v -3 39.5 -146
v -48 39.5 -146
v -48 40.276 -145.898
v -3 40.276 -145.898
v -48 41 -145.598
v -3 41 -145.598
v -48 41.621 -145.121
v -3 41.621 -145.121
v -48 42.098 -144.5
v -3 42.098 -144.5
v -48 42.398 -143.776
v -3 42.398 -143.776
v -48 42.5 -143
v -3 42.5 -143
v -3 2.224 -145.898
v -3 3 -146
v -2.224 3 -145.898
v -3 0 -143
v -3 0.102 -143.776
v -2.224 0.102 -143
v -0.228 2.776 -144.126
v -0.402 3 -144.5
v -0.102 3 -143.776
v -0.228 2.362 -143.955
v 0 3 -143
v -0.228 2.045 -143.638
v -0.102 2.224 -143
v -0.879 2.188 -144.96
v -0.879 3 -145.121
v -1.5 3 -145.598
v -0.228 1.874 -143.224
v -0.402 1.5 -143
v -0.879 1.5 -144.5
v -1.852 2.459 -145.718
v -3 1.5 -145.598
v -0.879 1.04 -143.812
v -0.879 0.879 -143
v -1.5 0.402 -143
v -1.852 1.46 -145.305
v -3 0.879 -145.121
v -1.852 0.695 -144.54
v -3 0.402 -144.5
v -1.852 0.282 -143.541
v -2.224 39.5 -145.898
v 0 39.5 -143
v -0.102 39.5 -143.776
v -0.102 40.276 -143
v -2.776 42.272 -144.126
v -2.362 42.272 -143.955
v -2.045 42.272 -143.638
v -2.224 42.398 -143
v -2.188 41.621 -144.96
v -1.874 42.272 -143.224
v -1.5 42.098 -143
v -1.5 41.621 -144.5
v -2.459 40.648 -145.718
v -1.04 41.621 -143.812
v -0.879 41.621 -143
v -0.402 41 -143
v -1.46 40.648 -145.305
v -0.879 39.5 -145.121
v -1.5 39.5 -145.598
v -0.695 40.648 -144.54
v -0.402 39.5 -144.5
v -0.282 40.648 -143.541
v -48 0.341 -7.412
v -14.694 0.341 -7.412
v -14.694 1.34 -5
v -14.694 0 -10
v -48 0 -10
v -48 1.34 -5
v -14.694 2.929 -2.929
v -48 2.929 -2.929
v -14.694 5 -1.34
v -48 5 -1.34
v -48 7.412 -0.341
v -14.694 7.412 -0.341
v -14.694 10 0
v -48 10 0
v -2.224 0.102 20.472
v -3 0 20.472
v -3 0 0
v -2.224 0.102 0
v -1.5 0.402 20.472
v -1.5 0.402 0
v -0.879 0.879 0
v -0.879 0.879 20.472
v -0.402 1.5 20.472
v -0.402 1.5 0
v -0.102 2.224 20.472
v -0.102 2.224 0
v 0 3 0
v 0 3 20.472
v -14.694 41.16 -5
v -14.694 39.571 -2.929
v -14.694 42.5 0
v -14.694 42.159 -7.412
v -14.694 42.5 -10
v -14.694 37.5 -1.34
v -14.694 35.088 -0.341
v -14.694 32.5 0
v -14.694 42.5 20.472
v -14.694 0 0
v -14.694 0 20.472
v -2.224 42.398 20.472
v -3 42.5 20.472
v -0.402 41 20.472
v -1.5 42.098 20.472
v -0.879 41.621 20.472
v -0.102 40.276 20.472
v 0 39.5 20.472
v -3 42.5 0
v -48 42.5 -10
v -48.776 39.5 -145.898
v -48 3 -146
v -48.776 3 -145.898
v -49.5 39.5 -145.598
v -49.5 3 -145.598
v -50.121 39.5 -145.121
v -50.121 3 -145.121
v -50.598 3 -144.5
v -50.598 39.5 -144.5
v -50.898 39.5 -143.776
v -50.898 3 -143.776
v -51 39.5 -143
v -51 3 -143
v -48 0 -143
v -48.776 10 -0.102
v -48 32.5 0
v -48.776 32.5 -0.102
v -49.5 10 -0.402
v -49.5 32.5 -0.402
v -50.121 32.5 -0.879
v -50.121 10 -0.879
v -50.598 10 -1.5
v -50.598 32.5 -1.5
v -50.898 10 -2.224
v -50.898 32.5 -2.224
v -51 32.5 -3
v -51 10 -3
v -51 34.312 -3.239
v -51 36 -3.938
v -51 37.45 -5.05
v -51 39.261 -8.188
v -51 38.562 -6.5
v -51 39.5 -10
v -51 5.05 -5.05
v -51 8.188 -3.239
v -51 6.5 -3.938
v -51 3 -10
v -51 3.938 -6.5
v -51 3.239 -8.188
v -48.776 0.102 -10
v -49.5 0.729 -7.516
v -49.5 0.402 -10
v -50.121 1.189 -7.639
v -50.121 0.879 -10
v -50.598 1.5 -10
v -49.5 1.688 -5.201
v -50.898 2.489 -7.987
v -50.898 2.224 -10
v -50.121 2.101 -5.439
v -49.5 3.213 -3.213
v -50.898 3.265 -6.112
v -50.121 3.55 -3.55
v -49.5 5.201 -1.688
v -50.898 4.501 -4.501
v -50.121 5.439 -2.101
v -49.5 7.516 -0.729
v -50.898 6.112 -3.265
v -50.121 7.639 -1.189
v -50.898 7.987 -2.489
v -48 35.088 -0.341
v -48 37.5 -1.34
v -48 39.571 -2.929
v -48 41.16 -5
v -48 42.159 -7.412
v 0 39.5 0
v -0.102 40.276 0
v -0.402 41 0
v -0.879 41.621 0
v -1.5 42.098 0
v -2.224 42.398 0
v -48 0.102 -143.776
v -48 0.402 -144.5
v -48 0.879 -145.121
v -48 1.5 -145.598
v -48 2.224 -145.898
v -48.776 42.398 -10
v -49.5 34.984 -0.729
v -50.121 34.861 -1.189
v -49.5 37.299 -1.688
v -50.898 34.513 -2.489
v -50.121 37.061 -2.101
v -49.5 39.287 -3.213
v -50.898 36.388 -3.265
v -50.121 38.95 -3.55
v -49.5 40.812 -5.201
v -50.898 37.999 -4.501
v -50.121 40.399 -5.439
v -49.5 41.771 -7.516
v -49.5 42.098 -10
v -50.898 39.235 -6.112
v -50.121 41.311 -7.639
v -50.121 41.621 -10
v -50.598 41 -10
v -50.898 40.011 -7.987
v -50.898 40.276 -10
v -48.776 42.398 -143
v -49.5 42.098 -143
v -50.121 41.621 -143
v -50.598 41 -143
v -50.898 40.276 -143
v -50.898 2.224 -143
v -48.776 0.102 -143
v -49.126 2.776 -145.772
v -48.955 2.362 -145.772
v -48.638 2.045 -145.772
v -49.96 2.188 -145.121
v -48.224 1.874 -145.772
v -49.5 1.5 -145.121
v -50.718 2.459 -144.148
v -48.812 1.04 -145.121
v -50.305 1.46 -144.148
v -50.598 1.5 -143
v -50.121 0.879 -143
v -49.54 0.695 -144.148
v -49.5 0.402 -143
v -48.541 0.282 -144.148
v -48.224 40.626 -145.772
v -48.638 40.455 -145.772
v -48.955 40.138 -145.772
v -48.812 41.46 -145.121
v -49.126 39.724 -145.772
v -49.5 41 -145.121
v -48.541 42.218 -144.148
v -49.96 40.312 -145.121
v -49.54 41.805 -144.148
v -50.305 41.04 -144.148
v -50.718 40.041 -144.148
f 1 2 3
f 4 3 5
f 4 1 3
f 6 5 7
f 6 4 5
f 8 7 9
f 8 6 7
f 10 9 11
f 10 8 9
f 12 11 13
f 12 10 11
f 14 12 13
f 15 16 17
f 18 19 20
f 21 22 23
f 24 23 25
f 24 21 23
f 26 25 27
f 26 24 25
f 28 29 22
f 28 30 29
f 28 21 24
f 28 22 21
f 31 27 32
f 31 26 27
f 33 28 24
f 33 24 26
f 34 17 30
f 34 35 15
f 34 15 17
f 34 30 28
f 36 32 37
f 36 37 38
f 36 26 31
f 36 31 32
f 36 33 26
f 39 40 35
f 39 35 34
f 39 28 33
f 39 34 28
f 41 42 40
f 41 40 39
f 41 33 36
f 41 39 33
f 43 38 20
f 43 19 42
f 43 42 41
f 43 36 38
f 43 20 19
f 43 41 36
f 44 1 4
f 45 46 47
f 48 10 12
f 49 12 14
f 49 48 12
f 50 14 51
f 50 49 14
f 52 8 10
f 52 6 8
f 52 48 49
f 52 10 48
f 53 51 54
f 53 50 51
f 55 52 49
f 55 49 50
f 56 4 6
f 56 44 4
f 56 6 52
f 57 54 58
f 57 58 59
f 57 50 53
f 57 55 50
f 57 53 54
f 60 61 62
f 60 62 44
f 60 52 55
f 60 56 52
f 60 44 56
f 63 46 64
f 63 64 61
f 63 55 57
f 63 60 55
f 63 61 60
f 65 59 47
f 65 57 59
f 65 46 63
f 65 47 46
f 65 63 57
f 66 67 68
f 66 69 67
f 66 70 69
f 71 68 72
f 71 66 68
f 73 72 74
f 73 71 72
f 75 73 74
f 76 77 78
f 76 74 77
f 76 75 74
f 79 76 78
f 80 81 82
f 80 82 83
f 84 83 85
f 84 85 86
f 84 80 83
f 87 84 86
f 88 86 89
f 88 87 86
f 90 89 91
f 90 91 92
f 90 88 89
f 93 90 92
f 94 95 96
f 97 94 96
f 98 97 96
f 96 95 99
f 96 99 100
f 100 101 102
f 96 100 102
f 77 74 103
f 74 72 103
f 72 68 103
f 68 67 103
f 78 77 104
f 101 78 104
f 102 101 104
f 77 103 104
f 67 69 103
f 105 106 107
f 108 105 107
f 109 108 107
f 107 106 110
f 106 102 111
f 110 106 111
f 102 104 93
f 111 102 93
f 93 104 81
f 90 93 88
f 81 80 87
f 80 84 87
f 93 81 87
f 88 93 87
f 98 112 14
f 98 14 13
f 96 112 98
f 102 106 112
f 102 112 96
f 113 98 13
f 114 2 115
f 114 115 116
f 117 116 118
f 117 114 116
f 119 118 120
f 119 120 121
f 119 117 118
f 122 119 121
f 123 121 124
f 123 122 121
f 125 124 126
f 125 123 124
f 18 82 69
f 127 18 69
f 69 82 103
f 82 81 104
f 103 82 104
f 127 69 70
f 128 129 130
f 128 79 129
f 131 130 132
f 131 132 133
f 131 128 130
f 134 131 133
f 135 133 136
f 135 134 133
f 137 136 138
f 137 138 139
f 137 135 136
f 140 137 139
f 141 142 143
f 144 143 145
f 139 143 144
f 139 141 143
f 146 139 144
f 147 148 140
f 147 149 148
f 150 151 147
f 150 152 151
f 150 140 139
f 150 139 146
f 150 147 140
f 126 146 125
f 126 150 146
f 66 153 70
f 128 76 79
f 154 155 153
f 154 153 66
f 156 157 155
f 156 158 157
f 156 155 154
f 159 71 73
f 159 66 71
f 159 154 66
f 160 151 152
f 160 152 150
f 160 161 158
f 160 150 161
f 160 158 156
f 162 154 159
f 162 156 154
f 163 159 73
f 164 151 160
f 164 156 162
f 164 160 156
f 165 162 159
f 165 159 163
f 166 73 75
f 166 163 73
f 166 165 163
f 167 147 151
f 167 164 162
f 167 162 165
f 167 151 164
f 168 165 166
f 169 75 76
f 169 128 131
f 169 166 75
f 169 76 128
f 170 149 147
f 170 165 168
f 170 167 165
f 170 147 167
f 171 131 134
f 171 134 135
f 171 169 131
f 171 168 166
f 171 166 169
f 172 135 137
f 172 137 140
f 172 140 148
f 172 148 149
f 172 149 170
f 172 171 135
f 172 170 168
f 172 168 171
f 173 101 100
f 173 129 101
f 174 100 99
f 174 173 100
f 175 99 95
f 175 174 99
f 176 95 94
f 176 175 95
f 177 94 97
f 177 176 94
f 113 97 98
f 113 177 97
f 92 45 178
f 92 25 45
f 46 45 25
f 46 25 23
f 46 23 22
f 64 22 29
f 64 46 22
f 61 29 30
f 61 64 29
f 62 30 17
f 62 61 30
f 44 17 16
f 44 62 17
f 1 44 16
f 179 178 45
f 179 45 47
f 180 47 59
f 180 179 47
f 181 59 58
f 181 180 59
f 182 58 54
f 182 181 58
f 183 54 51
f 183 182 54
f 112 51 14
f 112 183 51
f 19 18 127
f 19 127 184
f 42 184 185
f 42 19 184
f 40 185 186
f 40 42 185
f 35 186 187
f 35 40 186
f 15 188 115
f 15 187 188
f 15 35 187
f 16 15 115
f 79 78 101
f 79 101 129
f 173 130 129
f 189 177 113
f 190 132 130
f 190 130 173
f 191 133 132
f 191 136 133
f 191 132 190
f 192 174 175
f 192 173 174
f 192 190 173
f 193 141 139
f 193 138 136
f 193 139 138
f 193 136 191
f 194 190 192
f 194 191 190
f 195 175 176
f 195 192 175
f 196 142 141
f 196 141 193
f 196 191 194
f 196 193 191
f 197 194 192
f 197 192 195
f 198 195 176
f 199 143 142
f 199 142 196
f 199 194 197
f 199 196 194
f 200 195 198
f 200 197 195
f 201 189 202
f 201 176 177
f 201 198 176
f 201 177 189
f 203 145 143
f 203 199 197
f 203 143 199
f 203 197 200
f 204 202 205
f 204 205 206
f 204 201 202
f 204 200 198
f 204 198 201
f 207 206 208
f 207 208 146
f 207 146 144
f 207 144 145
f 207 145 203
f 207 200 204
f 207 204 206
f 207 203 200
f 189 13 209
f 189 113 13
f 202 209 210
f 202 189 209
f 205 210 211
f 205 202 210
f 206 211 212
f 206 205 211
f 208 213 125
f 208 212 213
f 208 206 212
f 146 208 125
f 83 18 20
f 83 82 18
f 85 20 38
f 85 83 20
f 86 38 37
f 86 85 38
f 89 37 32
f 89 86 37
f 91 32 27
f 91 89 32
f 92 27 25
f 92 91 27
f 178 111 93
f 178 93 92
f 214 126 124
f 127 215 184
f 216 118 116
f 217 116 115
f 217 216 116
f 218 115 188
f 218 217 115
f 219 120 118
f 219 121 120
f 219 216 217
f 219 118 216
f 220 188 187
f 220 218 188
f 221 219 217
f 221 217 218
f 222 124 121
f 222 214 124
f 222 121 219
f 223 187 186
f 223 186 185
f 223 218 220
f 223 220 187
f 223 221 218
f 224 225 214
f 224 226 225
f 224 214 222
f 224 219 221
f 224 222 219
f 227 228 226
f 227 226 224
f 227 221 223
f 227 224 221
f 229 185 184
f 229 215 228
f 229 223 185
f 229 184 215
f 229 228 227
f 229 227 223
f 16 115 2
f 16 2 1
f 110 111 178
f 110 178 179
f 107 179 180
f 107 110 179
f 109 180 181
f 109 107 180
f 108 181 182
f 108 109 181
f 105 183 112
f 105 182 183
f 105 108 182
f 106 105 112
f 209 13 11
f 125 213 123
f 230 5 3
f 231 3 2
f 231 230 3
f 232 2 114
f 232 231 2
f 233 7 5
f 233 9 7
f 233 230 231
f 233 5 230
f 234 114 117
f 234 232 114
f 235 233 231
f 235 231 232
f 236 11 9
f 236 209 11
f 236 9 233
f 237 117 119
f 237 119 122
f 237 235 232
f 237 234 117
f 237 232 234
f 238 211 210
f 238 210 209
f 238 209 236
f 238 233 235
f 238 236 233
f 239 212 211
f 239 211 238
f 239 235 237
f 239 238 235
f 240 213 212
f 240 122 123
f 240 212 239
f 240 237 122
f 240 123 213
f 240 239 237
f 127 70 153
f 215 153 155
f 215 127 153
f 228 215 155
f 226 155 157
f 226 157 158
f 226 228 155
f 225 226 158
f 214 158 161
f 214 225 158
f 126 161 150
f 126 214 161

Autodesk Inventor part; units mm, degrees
ref_plane "YZ Plane" through (0, 0, 0) normal (1, 0, 0) x (0, 1, 0)
ref_plane "XZ Plane" through (0, 0, 0) normal (0, 1, 0) x (-1, 0, 0)
ref_plane "XY Plane" through (0, 0, 0) normal (0, 0, 1) x (1, 0, 0)
sketch "Sketch1" plane through (0, 0, 0) normal (0, 1, 0) x (-1, 0, 0)
  line L0 (14.6941, 0) -> (51, 0)
  line L1 (51, 0) -> (51, -146)
  line L2 (51, -146) -> (0, -146)
  line L3 (0, -146) -> (0, 0)
  line L4 (14.6941, 0) -> (14.6941, 20.4717)
  line L5 (14.6941, 20.4717) -> (0, 20.4717)
  line L6 (0, 20.4717) -> (0, 0)
  dimension "d0" = 51
  dimension "d1" = 146
extrude "Extrusion1" add sketch "Sketch1" along normal blind 42.5
fillet "Fillet1" radius 10 2 edges at (-32.847, 42.5, 0) (-32.847, 0, 0)
fillet "Fillet2" radius 3 11 edges at (-51, 2.9289, -2.9289) (-51, 21.25, 0) (-51, 39.5711, -2.9289) (-51, 42.5, -78) (-51, 0, -78) (-51, 21.25, -146) (-25.5, 0, -146) (0, 21.25, -146) (0, 0, -73) (0, 42.5, -73) (-25.5, 42.5, -146)
properties part number "Flight Battery 5000 mah 5S"
